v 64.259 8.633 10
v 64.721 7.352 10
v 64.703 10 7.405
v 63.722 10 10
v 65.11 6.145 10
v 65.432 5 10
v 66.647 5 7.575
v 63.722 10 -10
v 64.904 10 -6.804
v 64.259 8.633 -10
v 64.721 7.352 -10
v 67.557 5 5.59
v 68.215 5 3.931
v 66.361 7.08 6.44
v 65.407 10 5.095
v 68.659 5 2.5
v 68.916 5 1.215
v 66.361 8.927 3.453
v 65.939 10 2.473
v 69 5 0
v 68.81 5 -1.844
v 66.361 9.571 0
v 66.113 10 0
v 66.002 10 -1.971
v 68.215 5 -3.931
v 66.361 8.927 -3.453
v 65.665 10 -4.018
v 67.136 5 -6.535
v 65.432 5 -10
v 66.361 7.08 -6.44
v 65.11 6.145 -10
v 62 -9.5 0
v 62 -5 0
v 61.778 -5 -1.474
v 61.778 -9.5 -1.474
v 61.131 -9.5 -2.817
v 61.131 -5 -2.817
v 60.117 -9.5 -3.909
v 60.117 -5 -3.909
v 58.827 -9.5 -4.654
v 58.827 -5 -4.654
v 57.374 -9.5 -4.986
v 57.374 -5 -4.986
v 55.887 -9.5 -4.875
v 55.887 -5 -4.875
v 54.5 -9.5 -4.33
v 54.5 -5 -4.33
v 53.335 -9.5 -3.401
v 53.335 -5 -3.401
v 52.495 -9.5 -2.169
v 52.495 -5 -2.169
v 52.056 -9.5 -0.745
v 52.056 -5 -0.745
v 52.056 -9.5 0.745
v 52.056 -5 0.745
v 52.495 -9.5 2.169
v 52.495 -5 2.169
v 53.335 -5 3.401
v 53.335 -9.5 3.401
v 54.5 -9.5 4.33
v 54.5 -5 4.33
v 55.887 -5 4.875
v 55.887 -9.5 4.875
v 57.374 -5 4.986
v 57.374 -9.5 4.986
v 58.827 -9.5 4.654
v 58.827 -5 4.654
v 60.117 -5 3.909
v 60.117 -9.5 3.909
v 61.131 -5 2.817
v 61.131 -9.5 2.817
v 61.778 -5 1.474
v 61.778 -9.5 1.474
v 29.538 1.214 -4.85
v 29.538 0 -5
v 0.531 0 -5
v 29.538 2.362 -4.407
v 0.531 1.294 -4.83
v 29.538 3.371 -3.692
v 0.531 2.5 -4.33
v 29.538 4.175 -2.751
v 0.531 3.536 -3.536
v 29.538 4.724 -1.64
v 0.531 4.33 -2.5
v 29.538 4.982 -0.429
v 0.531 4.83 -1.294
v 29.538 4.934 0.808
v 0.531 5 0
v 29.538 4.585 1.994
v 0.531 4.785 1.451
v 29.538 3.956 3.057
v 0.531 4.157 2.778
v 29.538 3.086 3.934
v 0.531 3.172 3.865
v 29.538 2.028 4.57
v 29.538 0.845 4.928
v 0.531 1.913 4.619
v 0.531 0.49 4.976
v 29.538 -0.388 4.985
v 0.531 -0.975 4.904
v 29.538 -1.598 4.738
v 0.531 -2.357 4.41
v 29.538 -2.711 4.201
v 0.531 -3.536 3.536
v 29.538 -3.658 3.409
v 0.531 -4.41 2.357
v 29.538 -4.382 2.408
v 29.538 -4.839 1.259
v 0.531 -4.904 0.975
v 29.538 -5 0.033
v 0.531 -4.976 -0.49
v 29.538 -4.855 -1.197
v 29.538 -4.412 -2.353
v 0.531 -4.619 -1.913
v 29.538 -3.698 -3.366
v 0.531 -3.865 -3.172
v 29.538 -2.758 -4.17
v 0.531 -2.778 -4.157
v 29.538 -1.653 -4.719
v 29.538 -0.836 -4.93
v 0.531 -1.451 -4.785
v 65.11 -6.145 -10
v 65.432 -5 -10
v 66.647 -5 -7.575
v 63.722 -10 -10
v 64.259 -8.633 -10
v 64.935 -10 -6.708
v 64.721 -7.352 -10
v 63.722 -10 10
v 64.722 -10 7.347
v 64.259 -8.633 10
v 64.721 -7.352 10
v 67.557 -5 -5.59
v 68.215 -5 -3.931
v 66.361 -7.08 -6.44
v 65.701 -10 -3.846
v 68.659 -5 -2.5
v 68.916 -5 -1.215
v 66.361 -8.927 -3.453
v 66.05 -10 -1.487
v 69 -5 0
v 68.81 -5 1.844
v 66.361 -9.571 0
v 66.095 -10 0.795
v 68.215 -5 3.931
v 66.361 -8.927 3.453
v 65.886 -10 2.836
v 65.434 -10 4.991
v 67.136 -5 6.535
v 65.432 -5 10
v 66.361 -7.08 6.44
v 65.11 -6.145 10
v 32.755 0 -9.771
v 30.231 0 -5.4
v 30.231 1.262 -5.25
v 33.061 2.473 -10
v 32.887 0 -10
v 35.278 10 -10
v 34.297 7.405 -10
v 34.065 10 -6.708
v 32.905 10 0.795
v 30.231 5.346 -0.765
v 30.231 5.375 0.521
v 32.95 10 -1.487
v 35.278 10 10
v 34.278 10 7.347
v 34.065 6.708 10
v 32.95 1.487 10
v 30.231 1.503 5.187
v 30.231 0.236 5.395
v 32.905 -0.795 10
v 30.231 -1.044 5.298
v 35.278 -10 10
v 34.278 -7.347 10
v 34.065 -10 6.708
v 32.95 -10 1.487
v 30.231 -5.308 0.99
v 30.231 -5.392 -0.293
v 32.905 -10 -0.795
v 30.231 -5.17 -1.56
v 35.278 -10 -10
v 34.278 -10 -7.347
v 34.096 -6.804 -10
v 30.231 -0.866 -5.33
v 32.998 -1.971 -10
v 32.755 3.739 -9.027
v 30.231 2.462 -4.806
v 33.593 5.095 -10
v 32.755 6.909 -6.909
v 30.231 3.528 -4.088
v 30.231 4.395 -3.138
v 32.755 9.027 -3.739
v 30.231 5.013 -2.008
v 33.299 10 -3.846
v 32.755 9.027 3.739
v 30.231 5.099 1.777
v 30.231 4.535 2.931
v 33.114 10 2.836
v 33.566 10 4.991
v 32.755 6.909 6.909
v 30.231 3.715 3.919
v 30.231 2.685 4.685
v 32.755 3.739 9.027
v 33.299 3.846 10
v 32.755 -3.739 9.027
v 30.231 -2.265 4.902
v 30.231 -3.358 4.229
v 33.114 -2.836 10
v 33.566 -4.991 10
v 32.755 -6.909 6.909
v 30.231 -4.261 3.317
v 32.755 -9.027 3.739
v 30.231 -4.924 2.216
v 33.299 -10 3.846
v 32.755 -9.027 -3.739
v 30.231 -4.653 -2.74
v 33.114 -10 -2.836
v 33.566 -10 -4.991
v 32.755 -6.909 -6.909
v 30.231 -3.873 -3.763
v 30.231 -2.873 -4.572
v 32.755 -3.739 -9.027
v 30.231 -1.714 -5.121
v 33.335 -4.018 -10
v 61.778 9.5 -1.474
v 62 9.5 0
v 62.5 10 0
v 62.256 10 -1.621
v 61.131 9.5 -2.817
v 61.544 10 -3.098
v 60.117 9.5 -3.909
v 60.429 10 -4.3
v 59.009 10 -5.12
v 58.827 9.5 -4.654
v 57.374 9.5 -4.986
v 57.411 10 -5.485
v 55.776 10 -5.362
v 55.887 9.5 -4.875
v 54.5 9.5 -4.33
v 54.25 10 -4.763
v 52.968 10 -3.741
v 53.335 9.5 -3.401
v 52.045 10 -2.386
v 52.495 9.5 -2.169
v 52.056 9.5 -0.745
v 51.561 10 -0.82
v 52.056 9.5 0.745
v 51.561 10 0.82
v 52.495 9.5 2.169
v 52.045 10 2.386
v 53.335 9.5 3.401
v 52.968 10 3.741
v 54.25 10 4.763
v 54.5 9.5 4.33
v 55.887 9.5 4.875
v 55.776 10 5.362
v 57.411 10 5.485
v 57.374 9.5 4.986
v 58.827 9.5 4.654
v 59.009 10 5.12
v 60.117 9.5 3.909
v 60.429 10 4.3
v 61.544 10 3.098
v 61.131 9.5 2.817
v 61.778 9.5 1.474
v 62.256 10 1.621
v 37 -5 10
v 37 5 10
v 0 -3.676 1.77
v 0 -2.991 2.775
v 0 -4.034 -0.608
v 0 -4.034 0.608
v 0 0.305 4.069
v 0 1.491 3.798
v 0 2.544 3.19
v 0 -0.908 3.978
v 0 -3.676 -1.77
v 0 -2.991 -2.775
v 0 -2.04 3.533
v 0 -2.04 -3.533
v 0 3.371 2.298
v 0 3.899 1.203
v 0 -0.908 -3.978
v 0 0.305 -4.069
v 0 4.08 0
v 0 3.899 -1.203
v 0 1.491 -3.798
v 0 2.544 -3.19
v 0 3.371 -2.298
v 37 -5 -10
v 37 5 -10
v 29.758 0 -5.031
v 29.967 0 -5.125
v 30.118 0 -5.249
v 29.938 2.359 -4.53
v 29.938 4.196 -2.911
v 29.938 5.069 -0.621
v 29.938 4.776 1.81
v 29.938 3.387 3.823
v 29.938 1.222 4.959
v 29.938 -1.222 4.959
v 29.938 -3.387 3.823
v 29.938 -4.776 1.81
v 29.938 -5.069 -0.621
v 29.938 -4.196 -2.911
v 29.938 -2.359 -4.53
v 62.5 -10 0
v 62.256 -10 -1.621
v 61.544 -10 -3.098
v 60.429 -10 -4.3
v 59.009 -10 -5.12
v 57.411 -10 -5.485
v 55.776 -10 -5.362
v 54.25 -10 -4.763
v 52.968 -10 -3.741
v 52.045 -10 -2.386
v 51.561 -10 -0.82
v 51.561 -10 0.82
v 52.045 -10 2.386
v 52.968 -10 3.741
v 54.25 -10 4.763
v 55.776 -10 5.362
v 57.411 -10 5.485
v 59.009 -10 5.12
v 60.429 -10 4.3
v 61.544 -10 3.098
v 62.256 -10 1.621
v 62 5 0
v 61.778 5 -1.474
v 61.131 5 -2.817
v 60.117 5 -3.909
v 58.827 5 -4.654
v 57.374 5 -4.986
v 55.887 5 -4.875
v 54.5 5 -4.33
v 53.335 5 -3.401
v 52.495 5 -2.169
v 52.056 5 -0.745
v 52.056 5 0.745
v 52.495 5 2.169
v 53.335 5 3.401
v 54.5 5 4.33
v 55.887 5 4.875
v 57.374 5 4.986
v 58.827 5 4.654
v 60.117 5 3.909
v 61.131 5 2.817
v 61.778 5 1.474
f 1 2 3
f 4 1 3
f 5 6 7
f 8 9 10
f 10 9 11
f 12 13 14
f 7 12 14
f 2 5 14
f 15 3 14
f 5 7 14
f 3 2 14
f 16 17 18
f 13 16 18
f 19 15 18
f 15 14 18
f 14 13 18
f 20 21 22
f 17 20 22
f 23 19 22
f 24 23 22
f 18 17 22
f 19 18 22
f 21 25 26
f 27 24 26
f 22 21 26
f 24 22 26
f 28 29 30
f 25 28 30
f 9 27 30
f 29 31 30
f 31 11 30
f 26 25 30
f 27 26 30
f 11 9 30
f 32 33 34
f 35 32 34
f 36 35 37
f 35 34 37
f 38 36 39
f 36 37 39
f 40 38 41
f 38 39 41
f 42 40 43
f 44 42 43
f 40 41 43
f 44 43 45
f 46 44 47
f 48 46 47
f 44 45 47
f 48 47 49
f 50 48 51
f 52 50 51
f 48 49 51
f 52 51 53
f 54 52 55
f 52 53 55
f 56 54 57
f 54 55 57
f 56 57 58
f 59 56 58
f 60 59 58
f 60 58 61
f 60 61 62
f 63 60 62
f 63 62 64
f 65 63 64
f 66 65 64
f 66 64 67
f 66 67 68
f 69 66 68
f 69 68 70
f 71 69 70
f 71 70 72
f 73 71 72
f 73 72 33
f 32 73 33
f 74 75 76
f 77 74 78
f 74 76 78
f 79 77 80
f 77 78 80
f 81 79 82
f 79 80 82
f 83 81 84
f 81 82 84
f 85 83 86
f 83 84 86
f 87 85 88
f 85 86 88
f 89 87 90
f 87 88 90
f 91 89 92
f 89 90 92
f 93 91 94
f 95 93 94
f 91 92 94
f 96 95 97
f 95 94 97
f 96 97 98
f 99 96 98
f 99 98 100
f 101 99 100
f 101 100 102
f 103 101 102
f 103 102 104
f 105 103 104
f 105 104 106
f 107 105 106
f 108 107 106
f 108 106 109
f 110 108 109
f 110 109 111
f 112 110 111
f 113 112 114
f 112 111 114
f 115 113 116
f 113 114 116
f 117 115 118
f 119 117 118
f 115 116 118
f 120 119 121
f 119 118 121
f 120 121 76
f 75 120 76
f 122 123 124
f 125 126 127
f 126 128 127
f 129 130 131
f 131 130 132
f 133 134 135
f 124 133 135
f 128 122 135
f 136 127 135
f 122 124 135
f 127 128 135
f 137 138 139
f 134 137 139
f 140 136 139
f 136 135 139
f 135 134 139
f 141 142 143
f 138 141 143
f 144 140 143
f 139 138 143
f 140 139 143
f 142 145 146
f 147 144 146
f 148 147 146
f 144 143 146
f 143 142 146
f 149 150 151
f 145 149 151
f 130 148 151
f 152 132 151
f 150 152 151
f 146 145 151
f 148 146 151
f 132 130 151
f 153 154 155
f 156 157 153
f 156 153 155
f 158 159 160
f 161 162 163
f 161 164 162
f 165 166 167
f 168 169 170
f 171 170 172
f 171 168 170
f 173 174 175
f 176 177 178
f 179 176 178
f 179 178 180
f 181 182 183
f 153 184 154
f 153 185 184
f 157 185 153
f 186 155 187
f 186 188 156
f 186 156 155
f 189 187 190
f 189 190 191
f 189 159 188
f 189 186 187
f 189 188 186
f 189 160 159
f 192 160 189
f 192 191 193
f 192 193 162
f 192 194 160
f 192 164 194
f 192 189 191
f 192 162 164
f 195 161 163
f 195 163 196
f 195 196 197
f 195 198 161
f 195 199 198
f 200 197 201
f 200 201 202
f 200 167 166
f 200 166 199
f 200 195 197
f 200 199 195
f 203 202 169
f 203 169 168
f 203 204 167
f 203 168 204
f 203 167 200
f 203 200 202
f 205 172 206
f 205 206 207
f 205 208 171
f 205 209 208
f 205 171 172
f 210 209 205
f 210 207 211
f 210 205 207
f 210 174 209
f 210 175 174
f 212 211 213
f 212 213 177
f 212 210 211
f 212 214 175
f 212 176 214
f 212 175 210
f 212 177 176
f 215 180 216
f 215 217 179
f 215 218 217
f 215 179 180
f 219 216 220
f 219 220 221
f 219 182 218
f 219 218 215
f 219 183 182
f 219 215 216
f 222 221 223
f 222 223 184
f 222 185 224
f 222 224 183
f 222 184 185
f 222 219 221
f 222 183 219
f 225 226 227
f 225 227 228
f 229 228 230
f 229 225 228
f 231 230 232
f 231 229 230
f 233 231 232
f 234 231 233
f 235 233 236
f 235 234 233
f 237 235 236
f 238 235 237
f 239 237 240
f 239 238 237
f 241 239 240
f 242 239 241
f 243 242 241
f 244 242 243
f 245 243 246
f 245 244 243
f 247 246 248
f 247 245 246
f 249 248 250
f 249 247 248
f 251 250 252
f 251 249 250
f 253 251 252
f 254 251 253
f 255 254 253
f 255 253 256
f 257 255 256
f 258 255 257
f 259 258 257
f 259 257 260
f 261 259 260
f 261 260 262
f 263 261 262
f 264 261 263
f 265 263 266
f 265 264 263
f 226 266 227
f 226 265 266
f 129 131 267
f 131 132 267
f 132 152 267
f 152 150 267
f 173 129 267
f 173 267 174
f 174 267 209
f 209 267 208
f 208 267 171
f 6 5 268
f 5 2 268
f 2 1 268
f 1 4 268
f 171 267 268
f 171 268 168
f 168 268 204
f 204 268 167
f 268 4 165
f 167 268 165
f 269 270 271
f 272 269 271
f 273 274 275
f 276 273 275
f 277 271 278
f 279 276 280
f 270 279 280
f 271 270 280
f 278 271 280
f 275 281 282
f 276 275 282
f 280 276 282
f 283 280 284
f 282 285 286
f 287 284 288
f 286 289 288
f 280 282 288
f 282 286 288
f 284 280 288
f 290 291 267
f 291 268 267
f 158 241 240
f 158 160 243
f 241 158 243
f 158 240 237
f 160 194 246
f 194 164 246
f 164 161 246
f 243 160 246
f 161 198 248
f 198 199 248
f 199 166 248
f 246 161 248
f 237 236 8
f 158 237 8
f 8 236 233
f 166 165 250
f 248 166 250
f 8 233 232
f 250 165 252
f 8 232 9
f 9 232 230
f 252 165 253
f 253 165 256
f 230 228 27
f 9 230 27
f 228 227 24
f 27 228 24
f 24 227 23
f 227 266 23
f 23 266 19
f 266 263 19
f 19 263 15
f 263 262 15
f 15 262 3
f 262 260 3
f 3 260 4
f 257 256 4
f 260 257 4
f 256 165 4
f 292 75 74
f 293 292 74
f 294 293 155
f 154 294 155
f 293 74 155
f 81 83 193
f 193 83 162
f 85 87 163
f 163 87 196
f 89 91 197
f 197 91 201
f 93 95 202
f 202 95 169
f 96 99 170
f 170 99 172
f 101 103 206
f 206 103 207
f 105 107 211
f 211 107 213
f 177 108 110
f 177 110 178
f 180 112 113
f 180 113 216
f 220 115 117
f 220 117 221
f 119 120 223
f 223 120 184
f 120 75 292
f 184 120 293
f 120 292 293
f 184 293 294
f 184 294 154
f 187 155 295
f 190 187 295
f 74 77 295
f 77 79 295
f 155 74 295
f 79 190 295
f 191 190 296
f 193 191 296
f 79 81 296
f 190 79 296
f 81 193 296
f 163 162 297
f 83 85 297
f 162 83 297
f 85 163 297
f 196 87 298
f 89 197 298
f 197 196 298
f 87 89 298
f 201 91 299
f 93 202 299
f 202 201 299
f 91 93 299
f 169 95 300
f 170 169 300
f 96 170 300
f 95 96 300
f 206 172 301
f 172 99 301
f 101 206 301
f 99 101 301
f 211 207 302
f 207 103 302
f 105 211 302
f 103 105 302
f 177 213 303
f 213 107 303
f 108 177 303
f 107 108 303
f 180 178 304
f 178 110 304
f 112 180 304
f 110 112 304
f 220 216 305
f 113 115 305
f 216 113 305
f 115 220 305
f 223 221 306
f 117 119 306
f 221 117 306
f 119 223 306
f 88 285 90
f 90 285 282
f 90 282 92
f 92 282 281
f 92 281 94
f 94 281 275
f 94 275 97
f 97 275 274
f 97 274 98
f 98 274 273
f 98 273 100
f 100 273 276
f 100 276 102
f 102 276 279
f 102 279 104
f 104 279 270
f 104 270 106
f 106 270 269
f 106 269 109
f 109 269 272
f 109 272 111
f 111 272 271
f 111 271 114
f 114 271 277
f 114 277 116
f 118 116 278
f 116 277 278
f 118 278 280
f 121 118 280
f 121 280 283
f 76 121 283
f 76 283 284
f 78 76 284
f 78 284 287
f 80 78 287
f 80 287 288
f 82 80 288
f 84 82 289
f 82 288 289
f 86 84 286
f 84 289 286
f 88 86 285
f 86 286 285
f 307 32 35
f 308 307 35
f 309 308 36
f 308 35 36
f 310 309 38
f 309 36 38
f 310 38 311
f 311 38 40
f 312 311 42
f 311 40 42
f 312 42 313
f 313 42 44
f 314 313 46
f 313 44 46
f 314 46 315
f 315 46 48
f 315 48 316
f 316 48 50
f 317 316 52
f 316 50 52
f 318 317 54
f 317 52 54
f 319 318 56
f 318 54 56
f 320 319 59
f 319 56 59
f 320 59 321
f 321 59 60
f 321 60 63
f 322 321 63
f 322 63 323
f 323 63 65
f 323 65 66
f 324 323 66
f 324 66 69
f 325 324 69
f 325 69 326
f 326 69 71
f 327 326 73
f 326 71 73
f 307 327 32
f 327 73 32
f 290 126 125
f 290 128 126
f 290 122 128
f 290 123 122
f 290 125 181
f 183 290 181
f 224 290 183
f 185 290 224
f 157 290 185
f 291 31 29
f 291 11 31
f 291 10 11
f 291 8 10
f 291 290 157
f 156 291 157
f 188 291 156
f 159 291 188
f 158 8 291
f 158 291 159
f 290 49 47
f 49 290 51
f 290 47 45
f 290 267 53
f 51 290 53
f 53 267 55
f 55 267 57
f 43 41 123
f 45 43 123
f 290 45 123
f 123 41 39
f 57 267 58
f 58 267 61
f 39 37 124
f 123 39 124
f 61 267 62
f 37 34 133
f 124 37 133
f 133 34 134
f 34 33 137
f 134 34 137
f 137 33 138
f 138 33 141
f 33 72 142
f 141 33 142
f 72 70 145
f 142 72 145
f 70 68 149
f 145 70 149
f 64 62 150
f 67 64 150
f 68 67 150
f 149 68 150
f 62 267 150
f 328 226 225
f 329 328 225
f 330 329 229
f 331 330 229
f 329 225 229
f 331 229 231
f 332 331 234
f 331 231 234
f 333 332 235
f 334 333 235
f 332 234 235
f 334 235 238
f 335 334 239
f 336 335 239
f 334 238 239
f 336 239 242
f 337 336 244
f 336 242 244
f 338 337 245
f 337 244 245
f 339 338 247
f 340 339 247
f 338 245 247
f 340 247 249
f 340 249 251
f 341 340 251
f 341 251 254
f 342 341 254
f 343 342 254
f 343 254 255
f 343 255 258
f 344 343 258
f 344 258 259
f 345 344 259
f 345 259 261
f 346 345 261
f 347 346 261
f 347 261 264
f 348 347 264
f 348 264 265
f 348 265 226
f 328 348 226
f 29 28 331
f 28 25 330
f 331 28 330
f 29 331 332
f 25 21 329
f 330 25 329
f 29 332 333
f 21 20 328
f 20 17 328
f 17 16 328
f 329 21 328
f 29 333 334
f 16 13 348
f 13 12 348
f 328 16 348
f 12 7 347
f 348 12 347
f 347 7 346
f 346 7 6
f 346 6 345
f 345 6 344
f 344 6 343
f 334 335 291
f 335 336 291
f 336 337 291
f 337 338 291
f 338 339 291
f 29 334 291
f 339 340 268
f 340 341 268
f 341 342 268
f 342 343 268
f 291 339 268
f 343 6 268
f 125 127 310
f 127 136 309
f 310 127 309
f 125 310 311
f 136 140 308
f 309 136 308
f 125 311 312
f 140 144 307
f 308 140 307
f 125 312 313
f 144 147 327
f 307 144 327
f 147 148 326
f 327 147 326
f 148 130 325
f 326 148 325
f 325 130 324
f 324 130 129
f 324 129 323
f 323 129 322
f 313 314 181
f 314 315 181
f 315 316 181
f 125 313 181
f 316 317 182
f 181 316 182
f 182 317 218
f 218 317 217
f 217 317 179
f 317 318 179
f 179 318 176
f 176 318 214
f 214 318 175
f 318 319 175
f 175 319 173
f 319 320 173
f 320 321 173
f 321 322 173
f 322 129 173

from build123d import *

# Parameters (mm, degrees)
SKETCH1_R                       = 5
EXTRUDE_L3_DEPTH                = 30
CLAW_EXTRUDE_DEPTH              = 10
THREAD_TO_CLAW_JOINING_FILLET_R = 0.8
SKETCH9_R                       = 5
CLEVIS_HOLE_DEPTH               = 1.0000001
CLEVIS_HOLE_DEPTH_BACK          = 21.0000001
CLEVIS_HOLE_CHAMFER_SIZE        = 0.5


with BuildPart() as part:
    # Sketch1 → L3 (new body)
    with BuildSketch(Plane(origin=(0, 0, 0), x_dir=(0, 0, -1), z_dir=(1, 0, 0))):
        Circle(SKETCH1_R)
    extrude(amount=EXTRUDE_L3_DEPTH)

    # Sketch6 → Claw Extrude (add, symmetric)
    with BuildSketch(Plane.XY):
        Polygon((30, -10), (30, 10), (69, 10), (69, 5), (37, 5), (37, -5), (69, -5), (69, -10), align=None)
    extrude(amount=CLAW_EXTRUDE_DEPTH, both=True)

    # Sketch8 → Claw Bevelling (revolve, cut)
    with BuildSketch(Plane(origin=(0, 0, 0), x_dir=(1, 0, 0), z_dir=(0, 1, 0))):
        Polygon((30, 5), (55.980762114, 50), (30, 50), align=None)
    revolve(axis=Axis((-49.725315437, 0, 0), (1, 0, 0)), mode=Mode.SUBTRACT)

    # Thread to Claw Joining Fillet
    thread_to_claw_joining_fillet_edges = [part.edges().sort_by_distance(p)[0] for p in [
        (30, 0, 5),
    ]]
    fillet(thread_to_claw_joining_fillet_edges, radius=THREAD_TO_CLAW_JOINING_FILLET_R)

    # Sketch11 → Claw Conic Taper (revolve, cut)
    with BuildSketch(Plane.XY):
        Polygon((11.264973081, 105), (69, 5), (69, 105), align=None)
    revolve(axis=Axis((56.222491899, 0, 0), (-1, 0, 0)), mode=Mode.SUBTRACT)

    # Sketch9 → Clevis Hole (cut, two sides)
    with BuildSketch(Plane(origin=(0, 10, 0), x_dir=(1, 0, 0), z_dir=(0, 1, 0))) as clevis_hole_sk:
        with Locations((57, 0)):
            Circle(SKETCH9_R)
    extrude(amount=CLEVIS_HOLE_DEPTH, mode=Mode.SUBTRACT)
    extrude(clevis_hole_sk.sketch, amount=-CLEVIS_HOLE_DEPTH_BACK, mode=Mode.SUBTRACT)

    # Clevis Hole Chamfer
    clevis_hole_chamfer_edges = [part.edges().sort_by_distance(p)[0] for p in [
        (52, -10, 0),
        (52, 10, 0),
    ]]
    chamfer(clevis_hole_chamfer_edges, length=CLEVIS_HOLE_CHAMFER_SIZE)

    # Sketch23 → Thread End Chamf (revolve, cut)
    with BuildSketch(Plane.XY):
        Polygon((0, 4.08), (0, 5), (0.531162248, 5), align=None)
    revolve(axis=Axis((-11.219306213, 0, 0), (1, 0, 0)), mode=Mode.SUBTRACT)


solid = part.part
